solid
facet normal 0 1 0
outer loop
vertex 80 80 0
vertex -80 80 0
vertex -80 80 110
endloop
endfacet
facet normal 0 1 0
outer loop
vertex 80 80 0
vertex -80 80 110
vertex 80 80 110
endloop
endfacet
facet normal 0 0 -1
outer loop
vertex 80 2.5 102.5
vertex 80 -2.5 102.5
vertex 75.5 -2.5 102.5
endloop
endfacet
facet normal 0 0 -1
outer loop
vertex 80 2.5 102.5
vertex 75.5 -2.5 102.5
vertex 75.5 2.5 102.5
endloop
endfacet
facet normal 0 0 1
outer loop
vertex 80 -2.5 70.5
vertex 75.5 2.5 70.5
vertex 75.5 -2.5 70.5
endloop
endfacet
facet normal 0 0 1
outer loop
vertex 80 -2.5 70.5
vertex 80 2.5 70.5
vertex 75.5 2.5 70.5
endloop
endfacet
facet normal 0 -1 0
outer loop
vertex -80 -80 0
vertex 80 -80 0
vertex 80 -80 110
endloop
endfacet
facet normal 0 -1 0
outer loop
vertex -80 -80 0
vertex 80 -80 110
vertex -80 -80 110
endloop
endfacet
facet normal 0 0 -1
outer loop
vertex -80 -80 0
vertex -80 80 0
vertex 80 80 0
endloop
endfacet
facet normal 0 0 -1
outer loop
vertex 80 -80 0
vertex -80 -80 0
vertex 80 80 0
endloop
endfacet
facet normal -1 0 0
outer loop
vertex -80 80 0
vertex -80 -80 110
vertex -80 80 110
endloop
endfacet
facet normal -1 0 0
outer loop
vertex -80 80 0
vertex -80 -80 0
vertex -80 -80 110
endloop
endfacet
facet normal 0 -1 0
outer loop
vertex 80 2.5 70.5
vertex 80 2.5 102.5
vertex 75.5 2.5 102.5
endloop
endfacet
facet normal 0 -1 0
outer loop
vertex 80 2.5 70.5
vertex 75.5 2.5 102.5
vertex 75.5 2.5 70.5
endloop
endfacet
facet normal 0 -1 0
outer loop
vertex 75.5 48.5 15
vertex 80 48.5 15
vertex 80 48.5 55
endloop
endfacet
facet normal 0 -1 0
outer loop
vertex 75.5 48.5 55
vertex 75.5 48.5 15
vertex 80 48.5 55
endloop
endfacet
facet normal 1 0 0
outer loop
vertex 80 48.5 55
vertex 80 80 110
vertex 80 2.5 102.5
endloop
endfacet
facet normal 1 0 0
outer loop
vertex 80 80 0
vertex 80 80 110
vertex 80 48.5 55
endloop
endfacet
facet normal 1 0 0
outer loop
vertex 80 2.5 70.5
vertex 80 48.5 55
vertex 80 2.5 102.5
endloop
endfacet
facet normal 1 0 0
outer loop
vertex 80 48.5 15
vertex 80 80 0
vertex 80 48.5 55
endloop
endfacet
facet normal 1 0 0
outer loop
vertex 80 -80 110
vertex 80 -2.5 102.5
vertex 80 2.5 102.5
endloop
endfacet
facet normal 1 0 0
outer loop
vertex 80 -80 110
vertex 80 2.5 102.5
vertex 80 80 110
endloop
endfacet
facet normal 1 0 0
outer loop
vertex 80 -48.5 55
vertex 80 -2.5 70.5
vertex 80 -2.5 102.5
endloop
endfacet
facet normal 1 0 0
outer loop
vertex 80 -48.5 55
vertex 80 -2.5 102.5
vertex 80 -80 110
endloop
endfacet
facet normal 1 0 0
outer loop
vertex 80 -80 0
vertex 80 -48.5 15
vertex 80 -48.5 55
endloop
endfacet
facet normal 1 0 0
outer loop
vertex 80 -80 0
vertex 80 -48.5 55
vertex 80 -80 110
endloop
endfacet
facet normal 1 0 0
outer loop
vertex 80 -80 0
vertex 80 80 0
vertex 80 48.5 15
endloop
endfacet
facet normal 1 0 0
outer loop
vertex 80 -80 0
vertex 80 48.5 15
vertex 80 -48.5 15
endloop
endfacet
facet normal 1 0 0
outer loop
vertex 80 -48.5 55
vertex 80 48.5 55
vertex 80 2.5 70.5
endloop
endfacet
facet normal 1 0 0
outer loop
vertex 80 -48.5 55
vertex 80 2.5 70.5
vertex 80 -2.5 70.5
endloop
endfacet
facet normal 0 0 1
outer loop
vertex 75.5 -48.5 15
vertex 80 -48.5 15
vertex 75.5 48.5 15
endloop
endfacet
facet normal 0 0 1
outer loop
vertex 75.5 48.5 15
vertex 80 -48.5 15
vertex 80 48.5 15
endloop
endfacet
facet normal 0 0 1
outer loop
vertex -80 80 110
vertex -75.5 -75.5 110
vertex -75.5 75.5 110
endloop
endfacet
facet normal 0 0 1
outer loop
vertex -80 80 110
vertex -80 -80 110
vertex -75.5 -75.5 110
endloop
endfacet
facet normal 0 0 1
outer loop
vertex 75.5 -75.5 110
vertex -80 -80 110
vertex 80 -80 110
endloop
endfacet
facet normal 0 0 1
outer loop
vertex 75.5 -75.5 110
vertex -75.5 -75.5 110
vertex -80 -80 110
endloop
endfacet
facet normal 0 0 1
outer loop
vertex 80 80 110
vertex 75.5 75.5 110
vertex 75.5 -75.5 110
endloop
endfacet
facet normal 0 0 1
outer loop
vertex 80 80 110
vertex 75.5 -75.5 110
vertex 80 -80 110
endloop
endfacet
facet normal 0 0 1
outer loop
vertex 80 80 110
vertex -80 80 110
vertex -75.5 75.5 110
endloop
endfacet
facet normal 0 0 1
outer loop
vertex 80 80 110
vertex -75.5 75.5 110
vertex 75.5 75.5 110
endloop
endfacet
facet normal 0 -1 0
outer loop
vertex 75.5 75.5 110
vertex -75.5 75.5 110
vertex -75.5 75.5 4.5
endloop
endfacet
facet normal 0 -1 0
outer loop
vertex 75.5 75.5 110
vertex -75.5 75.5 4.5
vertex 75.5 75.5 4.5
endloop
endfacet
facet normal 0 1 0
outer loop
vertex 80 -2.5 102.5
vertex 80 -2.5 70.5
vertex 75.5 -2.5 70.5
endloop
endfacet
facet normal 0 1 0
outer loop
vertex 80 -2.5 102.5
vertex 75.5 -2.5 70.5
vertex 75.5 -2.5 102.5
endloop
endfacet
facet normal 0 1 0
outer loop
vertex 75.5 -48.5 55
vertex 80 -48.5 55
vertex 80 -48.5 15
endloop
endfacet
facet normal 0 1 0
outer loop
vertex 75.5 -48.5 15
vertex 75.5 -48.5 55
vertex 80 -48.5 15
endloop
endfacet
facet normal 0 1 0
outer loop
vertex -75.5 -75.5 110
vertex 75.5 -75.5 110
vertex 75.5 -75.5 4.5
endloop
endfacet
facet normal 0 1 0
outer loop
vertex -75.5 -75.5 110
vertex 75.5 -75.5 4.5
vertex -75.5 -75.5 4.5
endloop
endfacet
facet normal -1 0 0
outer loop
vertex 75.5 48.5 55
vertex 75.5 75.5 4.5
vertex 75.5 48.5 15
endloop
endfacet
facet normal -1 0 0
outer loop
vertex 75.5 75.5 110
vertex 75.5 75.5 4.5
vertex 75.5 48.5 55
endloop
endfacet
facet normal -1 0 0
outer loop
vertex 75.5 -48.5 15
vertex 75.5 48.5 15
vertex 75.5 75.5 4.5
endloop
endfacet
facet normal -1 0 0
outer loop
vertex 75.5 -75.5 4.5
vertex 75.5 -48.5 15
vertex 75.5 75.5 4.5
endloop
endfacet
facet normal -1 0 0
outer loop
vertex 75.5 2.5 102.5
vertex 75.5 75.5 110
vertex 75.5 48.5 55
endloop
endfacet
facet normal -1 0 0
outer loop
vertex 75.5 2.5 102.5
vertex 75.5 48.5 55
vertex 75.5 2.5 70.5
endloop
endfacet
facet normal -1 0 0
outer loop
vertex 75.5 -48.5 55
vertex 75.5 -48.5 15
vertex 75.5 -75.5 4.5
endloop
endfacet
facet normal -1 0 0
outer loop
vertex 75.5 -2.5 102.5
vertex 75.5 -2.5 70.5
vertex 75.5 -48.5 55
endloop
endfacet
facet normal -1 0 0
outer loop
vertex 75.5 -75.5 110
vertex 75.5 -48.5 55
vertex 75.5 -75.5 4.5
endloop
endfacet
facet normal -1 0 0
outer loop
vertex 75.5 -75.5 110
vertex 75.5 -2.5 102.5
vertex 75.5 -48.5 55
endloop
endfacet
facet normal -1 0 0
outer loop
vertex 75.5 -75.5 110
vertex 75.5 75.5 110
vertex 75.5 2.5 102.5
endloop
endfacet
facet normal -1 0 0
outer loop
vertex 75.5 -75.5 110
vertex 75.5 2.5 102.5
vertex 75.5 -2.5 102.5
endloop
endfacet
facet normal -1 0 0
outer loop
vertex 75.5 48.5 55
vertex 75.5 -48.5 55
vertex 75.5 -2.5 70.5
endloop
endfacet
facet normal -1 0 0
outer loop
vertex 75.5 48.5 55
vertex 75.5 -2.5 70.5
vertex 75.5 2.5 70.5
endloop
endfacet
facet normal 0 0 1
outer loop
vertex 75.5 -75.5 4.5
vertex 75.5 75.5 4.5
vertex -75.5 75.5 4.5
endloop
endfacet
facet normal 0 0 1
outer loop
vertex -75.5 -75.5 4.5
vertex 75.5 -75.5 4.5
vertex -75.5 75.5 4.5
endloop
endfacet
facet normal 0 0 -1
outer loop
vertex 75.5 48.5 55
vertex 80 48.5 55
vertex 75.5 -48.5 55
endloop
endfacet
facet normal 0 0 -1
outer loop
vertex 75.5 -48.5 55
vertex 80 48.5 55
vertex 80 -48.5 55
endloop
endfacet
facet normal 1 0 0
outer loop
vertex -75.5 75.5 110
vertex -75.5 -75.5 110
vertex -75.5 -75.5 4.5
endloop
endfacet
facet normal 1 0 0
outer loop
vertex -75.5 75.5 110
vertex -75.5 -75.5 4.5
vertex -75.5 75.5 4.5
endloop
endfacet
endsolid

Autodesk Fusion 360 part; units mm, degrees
sketch "Sketch1" plane through (0, 0, 0) normal (0, 0, 1) x (1, 0, 0)
  line L0 (-80, 80) -> (80, 80)
  line L1 (80, 80) -> (80, -80)
  line L2 (80, -80) -> (-80, -80)
  line L3 (-80, -80) -> (-80, 80)
  line L4 (-80, 80) -> (80, -80) construction
  line L5 (80, 80) -> (-80, -80) construction
  dimension "d1" = 160
  dimension "d3" = 160
extrude "Extrude1" add sketch "Sketch1" along normal blind 110
sketch "Sketch3" plane through (0, 0, 110) normal (0, 0, 1) x (-1, 0, 0)
  line L0 (80, 80) -> (-80, 80)
  line L1 (-80, 80) -> (-80, -80)
  line L2 (-80, -80) -> (80, -80)
  line L3 (80, -80) -> (80, 80)
  line L4 (75.5, -75.5) -> (-75.5, -75.5)
  line L5 (-75.5, -75.5) -> (-75.5, 75.5)
  line L6 (-75.5, 75.5) -> (75.5, 75.5)
  line L7 (75.5, 75.5) -> (75.5, -75.5)
  line L8 (75.5, -75.5) -> (-75.5, 75.5) construction
  line L9 (-75.5, -75.5) -> (75.5, 75.5) construction
  dimension "d7" = 151
  dimension "d8" = 151
extrude "Extrude2" cut sketch "Sketch3" against normal blind 105.5 contours L4 L5 L6 L7
sketch "Sketch4" plane through (80, 0, 0) normal (1, 0, 0) x (0, 1, 0)
  line L0 (-80, 0) -> (80, 0)
  line L1 (80, 0) -> (80, 110)
  line L2 (80, 110) -> (-80, 110)
  line L3 (-80, 110) -> (-80, 0)
  line L4 (2.5, 70.5) -> (-2.5, 70.5)
  line L5 (-2.5, 70.5) -> (-2.5, 102.5)
  line L6 (-2.5, 102.5) -> (2.5, 102.5)
  line L7 (2.5, 102.5) -> (2.5, 70.5)
  line L8 (2.5, 70.5) -> (-2.5, 102.5) construction
  line L9 (-2.5, 70.5) -> (2.5, 102.5) construction
  point P0 (0, 86.5)
  dimension "d11" = 7.5
  dimension "d12" = 32
  dimension "d13" = 5
  dimension "d14" = 77.5
extrude "Extrude3" cut sketch "Sketch4" against normal blind 5 contours L4 L5 L6 L7
sketch "Sketch5" plane through (80, 0, 0) normal (1, 0, 0) x (0, 1, 0)
  line L0 (-2.5, 70.5) -> (-2.5, 102.5)
  line L1 (-2.5, 102.5) -> (2.5, 102.5)
  line L2 (2.5, 102.5) -> (2.5, 70.5)
  line L3 (2.5, 70.5) -> (-2.5, 70.5)
  line L4 (-80, 0) -> (80, 0)
  line L5 (80, 0) -> (80, 110)
  line L6 (80, 110) -> (-80, 110)
  line L7 (-80, 110) -> (-80, 0)
  line L8 (48.5, 55) -> (-48.5, 55)
  line L9 (-48.5, 55) -> (-48.5, 15)
  line L10 (-48.5, 15) -> (48.5, 15)
  line L11 (48.5, 15) -> (48.5, 55)
  line L12 (48.5, 55) -> (-48.5, 15) construction
  line L13 (-48.5, 55) -> (48.5, 15) construction
  point P0 (0, 35)
  dimension "d17" = 97
  dimension "d18" = 31.5
  dimension "d19" = 40
  dimension "d20" = 15
extrude "Extrude4" cut sketch "Sketch5" against normal blind 5 contours L8 L9 L10 L11
equation "d1 = Cube_size"
equation "d3 = Cube_size"
equation "Cube_size = 160 mm"
equation "d5 = Cube_size / 16 * 11"
equation "d7 = Cube_size - Cube_size * 0.05625"
equation "d8 = Cube_size - Cube_size * 0.05625"
equation "d9 = 0.6875 * Cube_size * 0.0409090909090909 - 0.6875 * Cube_size"
equation "d11 = 0.6875 * Cube_size * 0.0681818181818182"
equation "d12 = 0.6875 * Cube_size * 0.2909090909090909"
equation "d13 = 0.0454545454545455 * 0.6875 * Cube_size"
equation "d14 = ( Cube_size - 0.0454545454545455 * 0.6875 * Cube_size ) / 2"
equation "d15 = -Cube_size * 0.03125"
equation "d17 = Cube_size * 0.60625"
equation "d18 = Cube_size * 0.196875"
equation "d19 = 0.25 * Cube_size"
equation "d20 = Cube_size * 0.09375"
equation "d21 = -Cube_size * 0.03125"
